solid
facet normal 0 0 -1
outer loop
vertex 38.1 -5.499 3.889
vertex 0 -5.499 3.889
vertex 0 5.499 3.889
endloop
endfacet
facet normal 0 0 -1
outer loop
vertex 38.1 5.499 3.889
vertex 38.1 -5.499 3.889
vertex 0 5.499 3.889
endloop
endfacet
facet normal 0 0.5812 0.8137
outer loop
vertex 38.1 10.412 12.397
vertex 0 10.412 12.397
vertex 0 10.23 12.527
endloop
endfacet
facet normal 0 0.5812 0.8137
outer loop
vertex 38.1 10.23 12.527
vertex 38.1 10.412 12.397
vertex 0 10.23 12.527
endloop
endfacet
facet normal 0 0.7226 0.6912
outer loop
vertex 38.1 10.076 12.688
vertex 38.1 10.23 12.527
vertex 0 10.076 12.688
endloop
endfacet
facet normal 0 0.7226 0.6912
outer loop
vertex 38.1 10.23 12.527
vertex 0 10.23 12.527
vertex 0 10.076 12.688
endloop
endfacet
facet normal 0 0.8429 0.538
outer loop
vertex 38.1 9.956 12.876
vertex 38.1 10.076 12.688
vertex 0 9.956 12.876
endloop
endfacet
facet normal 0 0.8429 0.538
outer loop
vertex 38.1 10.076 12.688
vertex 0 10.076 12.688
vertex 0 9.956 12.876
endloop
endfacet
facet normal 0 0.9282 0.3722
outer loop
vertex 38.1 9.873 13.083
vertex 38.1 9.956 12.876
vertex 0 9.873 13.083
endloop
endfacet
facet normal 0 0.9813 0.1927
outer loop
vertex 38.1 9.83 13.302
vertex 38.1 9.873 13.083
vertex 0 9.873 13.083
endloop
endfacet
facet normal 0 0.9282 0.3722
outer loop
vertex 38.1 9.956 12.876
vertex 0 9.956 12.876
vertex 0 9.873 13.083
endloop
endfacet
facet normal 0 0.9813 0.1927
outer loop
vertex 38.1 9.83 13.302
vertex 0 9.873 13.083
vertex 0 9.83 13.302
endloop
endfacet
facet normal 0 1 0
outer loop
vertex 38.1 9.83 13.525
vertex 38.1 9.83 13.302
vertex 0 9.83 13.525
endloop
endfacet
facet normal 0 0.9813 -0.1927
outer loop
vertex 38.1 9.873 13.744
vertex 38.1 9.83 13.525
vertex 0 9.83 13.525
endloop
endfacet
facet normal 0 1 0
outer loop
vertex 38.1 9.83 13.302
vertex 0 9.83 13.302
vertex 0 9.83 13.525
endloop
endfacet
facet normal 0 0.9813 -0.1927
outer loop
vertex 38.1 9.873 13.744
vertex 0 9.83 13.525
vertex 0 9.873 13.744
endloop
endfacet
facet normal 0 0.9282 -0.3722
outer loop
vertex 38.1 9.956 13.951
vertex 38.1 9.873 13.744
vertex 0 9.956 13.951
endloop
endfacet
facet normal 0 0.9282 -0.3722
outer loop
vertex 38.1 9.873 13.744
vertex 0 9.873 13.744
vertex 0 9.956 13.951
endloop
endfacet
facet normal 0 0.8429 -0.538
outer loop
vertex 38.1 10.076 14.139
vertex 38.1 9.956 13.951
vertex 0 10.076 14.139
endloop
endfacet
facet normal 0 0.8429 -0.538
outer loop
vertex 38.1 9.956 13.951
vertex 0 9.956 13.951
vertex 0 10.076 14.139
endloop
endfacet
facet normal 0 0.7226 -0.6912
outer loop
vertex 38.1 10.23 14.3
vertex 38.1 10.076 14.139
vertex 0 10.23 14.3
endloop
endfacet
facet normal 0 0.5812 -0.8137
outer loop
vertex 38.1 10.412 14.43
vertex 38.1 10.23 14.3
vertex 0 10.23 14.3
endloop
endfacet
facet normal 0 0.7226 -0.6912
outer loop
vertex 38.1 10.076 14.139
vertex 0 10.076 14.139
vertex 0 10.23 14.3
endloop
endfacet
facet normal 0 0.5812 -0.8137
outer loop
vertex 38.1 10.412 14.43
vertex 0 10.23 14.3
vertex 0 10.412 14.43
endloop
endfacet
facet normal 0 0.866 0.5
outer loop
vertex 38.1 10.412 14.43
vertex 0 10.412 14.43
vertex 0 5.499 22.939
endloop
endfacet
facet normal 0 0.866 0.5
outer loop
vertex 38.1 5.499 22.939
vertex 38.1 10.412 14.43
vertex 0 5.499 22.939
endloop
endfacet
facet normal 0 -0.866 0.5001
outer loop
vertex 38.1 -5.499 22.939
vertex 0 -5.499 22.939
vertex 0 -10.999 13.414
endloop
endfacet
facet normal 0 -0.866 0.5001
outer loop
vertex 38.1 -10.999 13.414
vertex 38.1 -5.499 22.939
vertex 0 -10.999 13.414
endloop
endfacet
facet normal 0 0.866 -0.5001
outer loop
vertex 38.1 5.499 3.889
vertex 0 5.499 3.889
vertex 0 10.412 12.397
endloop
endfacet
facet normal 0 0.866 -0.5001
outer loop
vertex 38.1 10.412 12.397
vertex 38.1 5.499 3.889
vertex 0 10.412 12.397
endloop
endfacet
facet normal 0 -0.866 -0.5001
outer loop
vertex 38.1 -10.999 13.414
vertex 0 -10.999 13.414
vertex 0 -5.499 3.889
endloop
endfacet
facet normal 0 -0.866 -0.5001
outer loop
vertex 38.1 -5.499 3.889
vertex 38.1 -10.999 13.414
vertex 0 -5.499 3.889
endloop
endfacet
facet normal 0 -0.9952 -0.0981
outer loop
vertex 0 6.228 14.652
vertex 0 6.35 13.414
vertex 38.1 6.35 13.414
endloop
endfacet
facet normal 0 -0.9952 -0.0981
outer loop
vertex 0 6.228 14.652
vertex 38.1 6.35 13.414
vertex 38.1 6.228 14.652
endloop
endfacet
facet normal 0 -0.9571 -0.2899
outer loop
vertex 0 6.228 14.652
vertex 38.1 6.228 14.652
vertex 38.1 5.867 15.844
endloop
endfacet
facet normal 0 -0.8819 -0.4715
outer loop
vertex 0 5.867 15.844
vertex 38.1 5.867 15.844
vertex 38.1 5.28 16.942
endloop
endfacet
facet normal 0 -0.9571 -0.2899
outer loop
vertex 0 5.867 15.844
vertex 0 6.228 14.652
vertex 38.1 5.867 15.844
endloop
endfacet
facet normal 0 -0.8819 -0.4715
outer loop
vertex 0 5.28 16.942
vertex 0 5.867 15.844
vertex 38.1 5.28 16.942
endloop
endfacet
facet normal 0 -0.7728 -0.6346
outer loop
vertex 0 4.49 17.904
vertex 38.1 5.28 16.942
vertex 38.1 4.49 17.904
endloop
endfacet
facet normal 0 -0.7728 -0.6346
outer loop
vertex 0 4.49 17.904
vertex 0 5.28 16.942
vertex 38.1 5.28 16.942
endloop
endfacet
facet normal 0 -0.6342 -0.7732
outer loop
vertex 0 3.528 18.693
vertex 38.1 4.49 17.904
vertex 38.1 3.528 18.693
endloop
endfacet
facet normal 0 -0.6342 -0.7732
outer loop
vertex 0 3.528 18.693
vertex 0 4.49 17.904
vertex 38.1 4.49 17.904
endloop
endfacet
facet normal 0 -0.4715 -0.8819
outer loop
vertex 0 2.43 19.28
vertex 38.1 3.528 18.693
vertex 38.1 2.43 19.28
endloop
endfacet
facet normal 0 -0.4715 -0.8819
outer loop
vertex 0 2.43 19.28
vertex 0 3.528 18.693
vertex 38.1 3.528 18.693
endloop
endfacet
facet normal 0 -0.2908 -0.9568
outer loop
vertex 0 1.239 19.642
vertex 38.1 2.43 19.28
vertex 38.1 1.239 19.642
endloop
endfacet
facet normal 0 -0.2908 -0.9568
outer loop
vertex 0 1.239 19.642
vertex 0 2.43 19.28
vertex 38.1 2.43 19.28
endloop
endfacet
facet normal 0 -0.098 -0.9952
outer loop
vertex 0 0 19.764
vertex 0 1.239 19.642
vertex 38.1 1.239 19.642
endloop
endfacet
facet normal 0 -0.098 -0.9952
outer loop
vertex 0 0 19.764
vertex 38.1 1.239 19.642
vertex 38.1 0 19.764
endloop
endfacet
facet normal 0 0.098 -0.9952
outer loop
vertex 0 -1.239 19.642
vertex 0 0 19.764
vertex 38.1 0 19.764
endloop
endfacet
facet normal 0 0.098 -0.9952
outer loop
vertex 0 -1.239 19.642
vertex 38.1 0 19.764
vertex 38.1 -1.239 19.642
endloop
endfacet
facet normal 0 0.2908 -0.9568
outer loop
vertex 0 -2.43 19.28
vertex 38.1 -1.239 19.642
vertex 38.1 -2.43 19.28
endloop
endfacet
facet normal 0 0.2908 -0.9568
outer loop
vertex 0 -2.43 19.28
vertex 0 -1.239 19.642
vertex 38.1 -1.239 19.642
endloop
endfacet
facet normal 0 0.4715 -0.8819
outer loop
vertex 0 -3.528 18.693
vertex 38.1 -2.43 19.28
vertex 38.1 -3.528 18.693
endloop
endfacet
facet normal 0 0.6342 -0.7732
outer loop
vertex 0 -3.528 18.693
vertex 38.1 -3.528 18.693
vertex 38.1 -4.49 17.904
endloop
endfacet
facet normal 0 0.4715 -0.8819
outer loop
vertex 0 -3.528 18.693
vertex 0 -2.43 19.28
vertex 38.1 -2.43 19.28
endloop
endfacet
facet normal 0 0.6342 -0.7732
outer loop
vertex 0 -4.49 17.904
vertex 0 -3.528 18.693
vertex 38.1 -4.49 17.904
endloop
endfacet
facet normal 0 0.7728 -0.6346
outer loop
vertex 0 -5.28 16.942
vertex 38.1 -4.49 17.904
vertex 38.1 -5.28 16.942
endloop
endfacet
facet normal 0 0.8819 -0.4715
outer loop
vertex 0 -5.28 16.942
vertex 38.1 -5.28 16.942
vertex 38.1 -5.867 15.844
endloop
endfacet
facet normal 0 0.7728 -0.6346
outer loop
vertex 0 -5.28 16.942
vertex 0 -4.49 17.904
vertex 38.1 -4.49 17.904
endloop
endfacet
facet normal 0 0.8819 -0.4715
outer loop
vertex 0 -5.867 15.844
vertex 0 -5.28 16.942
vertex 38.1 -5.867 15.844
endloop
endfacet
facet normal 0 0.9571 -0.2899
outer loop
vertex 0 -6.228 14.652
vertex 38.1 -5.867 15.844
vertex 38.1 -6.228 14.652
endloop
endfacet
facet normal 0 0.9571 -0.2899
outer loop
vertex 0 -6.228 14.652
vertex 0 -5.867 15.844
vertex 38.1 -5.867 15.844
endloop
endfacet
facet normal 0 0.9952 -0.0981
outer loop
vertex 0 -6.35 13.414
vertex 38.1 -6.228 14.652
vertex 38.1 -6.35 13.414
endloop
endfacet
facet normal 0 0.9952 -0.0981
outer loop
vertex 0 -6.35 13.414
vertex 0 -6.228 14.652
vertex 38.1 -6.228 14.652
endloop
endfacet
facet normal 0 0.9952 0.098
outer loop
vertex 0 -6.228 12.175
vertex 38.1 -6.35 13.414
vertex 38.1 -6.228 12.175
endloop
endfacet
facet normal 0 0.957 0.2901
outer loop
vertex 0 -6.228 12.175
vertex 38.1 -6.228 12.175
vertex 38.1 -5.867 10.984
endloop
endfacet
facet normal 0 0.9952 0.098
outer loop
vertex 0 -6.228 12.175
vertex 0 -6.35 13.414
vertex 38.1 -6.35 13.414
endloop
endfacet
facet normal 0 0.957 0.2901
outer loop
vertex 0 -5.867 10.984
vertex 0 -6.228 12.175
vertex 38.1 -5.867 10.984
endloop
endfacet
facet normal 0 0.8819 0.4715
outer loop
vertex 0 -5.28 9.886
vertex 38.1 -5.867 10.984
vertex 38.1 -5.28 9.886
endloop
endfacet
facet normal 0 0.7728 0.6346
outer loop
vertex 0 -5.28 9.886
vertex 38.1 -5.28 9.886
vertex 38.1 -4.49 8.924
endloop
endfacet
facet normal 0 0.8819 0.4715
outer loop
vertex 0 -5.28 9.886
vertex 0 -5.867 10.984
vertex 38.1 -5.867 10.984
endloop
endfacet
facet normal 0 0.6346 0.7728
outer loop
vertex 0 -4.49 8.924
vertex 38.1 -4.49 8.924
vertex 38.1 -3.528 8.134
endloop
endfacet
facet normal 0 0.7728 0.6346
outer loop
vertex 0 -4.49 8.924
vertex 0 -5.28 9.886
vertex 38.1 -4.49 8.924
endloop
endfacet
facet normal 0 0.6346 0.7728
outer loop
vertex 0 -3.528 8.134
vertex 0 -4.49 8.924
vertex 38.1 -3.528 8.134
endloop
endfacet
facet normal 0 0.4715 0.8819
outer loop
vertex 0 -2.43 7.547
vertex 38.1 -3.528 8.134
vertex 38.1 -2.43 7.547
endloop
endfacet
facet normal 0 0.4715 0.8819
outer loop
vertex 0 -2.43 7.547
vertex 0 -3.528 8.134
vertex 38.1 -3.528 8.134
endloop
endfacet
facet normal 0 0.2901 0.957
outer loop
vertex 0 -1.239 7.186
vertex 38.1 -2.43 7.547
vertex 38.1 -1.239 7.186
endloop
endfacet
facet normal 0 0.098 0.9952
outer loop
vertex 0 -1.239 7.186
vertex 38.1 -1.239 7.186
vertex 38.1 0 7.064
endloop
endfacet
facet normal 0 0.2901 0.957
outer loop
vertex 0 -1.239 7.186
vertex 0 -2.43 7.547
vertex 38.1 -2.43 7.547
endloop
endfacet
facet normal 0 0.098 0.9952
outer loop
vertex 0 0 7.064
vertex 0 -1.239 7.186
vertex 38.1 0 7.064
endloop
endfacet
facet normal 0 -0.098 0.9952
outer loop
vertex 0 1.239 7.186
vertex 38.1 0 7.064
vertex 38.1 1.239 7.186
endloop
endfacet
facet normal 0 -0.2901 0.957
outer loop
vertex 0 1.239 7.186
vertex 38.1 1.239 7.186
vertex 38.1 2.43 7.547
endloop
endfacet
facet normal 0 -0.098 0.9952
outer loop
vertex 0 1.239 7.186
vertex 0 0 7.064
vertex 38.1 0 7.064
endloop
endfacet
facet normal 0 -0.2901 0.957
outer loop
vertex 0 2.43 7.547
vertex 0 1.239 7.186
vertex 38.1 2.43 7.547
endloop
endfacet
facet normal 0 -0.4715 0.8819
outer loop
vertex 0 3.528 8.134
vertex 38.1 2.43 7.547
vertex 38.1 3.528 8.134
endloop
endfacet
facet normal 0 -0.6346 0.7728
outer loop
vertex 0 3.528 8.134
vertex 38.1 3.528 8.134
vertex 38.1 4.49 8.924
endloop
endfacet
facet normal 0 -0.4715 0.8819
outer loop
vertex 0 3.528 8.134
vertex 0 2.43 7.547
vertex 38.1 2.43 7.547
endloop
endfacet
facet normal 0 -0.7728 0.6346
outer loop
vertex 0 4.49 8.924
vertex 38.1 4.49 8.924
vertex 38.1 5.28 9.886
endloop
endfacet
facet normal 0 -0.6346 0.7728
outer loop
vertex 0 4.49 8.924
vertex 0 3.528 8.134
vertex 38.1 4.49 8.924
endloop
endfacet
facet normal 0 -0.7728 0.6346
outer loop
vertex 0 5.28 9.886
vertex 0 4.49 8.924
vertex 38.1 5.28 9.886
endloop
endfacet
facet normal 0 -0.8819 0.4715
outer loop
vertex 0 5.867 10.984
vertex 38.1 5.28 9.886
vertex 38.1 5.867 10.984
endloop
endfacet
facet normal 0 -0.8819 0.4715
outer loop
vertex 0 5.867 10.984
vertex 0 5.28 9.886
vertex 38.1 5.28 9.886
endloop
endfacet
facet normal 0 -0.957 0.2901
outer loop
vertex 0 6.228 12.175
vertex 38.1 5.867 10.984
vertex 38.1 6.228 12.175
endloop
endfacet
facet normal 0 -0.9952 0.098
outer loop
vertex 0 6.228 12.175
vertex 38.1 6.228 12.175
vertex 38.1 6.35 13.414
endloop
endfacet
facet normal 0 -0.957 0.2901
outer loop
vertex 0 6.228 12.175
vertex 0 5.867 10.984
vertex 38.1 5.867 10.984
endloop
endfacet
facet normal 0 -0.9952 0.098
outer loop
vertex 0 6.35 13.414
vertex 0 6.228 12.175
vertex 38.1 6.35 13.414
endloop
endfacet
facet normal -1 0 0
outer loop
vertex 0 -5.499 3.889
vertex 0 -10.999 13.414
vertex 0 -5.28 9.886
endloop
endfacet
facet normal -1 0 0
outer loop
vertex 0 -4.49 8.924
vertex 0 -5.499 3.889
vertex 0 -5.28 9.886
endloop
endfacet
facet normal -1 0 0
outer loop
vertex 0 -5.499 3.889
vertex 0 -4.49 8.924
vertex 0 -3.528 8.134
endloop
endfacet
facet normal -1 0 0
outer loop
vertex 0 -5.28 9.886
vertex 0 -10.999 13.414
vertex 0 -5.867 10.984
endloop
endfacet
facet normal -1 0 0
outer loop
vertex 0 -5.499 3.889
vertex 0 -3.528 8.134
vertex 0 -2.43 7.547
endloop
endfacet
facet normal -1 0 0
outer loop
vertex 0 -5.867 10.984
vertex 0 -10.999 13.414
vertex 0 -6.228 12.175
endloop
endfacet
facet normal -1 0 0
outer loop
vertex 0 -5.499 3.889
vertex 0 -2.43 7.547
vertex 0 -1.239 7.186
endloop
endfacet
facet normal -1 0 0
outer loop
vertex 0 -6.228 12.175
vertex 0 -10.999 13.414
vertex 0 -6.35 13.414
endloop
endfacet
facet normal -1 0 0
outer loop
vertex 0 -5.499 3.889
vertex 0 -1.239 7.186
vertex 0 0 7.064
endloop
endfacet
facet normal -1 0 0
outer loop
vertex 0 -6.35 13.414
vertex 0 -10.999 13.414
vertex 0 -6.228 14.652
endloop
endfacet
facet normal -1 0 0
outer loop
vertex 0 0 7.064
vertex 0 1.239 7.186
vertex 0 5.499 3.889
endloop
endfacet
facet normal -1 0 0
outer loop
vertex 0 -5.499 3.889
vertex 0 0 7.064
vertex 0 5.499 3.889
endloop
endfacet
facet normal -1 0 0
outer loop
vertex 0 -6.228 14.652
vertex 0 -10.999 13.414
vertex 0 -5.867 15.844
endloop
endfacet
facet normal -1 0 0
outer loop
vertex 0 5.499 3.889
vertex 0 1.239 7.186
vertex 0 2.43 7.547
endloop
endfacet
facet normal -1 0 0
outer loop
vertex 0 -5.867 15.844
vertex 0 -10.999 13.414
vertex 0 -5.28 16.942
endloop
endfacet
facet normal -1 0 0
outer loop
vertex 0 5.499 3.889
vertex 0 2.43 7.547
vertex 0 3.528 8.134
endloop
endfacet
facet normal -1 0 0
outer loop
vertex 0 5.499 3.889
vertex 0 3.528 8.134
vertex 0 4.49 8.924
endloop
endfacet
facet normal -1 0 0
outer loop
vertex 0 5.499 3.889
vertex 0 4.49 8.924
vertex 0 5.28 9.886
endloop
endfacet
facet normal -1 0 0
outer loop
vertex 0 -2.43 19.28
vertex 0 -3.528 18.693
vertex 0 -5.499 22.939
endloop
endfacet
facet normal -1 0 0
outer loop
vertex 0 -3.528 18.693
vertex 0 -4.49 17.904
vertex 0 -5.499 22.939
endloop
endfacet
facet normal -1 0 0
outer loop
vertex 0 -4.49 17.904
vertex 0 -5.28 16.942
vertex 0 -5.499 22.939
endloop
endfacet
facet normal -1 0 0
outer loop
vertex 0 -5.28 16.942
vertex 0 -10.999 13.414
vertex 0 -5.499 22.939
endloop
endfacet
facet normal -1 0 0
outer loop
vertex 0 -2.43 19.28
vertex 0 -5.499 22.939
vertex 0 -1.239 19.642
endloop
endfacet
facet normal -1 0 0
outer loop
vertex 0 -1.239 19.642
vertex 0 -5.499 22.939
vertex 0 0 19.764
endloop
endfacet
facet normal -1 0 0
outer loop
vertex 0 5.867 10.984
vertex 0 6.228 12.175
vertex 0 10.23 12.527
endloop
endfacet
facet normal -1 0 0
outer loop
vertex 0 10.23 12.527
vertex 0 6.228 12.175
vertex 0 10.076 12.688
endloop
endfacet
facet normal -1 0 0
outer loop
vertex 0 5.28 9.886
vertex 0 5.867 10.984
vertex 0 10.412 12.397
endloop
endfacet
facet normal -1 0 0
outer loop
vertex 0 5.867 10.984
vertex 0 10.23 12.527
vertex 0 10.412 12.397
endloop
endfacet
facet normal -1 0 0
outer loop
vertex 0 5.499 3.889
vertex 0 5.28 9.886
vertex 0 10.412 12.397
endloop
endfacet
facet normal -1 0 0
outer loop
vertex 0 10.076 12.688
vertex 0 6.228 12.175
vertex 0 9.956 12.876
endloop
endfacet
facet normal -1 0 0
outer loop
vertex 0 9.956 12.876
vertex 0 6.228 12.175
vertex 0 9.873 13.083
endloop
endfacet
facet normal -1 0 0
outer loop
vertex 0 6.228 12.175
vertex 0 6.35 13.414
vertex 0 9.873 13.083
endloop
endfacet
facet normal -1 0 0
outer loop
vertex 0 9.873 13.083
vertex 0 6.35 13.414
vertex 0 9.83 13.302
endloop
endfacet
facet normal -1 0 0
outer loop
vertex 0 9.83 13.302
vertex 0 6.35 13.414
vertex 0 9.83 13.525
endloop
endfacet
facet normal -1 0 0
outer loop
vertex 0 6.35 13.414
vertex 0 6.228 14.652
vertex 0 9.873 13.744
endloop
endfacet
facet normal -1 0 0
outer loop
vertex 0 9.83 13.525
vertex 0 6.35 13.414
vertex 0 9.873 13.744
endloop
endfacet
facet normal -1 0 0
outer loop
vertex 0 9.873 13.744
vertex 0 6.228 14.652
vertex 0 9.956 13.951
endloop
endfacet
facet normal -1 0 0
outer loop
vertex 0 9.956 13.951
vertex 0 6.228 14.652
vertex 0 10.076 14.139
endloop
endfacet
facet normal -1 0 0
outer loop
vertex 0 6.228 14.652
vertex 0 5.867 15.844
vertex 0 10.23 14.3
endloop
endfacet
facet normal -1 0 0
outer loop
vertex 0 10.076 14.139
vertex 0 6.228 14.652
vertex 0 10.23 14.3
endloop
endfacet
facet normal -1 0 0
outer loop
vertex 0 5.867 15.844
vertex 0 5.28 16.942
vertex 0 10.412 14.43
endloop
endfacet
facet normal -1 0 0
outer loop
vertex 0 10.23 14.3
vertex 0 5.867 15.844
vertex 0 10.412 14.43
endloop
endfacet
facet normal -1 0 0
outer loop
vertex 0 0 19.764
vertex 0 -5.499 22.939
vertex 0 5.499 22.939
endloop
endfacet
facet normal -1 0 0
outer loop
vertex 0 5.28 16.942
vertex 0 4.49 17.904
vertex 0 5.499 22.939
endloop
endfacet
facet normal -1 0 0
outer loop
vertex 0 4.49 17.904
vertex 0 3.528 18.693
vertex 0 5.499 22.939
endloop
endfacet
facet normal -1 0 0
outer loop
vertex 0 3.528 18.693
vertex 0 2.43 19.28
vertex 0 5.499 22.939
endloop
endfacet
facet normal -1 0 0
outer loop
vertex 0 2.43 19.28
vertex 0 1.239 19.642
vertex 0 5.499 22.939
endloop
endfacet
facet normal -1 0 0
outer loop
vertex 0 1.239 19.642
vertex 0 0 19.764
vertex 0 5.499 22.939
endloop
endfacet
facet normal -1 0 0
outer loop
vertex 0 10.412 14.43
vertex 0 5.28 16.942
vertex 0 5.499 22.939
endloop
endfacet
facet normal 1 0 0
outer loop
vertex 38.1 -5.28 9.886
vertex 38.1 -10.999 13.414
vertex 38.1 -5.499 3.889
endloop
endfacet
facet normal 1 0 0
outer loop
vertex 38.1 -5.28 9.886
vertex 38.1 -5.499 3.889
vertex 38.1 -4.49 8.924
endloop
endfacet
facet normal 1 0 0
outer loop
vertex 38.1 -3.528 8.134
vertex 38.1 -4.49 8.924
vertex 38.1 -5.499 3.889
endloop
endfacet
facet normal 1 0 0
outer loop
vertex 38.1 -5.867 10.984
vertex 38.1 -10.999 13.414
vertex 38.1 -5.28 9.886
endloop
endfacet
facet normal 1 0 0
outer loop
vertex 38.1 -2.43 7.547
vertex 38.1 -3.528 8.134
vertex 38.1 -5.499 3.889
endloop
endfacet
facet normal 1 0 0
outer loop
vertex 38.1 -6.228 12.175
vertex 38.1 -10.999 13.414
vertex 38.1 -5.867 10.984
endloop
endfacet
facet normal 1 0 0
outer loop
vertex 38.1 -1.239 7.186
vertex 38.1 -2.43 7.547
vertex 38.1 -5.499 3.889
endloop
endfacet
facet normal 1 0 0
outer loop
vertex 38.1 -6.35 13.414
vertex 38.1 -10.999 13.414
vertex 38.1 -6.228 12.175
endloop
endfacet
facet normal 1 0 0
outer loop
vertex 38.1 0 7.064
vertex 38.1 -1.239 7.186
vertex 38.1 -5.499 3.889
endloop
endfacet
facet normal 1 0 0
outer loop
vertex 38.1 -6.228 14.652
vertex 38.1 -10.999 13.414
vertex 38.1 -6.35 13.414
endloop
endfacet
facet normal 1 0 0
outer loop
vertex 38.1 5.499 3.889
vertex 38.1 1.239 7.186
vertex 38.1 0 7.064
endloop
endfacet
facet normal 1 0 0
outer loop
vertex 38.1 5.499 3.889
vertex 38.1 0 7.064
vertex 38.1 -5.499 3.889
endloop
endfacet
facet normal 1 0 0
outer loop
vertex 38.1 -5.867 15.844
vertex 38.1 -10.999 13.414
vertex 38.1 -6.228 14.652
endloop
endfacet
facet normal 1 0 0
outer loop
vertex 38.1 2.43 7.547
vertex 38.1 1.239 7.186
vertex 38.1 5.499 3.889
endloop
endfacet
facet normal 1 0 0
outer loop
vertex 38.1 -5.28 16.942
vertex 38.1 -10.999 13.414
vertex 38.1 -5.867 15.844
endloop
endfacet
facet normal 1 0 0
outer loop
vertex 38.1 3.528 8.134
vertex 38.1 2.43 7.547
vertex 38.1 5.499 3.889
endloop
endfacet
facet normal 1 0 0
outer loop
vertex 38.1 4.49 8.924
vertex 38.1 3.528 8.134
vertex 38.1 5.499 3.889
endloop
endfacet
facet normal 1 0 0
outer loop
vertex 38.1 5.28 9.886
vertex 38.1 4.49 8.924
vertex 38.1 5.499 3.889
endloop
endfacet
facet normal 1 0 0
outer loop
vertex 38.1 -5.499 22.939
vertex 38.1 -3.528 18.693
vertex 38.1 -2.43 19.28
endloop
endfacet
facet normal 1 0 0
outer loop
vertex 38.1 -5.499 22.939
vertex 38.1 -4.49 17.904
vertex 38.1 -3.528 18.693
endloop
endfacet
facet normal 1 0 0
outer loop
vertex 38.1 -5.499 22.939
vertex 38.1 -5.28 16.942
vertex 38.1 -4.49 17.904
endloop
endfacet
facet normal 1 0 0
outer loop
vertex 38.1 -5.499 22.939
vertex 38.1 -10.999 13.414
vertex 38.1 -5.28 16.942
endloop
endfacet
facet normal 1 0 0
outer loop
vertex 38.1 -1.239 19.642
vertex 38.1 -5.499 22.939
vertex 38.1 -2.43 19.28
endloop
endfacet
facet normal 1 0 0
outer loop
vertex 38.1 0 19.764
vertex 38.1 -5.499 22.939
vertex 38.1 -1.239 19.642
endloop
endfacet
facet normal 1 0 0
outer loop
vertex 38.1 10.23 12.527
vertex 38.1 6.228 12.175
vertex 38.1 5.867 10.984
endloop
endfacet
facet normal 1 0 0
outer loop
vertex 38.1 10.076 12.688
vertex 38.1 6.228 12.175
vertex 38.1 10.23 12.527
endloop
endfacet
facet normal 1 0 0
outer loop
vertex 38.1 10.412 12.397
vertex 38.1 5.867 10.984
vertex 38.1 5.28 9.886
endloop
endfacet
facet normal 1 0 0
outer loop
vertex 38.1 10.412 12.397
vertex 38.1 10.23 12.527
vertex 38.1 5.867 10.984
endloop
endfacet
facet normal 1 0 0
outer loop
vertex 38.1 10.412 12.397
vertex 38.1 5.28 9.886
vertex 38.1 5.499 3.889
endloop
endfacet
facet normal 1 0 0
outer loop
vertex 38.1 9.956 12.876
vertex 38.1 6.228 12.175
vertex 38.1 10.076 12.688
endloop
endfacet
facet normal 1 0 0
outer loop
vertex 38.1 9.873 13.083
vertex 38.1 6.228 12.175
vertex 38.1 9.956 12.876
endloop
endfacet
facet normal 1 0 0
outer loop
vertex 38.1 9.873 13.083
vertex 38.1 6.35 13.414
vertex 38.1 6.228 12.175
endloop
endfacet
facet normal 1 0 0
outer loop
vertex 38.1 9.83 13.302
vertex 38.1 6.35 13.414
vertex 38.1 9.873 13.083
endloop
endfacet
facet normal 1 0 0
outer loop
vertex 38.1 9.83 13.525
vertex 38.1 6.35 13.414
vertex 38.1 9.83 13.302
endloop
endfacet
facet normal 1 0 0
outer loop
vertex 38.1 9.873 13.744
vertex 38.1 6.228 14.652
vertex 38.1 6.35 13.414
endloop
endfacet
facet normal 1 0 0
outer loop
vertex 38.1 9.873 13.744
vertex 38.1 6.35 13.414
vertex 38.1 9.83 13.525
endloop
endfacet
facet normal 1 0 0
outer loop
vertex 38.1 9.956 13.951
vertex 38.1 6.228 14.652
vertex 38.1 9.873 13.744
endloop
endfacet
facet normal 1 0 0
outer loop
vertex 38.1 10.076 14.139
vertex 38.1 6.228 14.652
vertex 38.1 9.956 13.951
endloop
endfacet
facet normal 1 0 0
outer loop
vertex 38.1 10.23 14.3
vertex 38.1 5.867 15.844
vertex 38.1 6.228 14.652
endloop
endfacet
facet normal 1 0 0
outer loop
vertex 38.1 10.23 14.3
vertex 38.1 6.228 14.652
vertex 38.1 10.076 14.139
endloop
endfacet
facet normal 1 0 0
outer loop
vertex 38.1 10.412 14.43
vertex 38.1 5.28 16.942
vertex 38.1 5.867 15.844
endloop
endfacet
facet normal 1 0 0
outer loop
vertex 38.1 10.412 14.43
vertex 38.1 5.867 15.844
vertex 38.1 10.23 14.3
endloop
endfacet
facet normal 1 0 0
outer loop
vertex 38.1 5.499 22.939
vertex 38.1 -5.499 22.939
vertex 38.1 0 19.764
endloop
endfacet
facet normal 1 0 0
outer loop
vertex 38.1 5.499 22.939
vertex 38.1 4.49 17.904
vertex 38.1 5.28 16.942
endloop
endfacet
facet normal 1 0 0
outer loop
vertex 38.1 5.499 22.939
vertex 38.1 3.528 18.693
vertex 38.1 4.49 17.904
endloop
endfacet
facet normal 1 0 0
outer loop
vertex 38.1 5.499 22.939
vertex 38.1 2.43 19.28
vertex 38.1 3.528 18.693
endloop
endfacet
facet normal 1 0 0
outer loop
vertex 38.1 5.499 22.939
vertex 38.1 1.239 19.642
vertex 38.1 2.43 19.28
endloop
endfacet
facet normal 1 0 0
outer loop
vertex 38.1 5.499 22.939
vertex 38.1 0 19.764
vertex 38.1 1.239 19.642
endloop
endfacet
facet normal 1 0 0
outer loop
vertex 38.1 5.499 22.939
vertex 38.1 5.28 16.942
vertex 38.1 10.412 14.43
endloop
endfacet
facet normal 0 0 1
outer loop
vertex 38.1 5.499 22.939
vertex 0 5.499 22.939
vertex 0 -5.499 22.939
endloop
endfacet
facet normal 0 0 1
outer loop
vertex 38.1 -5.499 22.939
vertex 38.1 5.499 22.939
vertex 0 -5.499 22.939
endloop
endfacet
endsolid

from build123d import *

# Parameters (mm, degrees)
F0_R     = 6.35
F1_DEPTH = 38.1


with BuildPart() as f1:
    # F0 (on Right) → F1 (new body)
    with BuildSketch(Plane.YZ):
        with BuildLine():
            Line((-5.499261, 3.888647), (5.499261, 3.888647))
            Line((5.499261, 3.888647), (10.411803, 12.397418))
            ThreePointArc((10.411803, 12.397418), (9.825083, 13.413647), (10.411803, 14.429875))
            Line((10.411803, 14.429875), (5.499261, 22.938647))
            Line((5.499261, 22.938647), (-5.499261, 22.938647))
            Line((-5.499261, 22.938647), (-10.998523, 13.413647))
            Line((-10.998523, 13.413647), (-5.499261, 3.888647))
        make_face()
        with Locations((0, 13.413647)):
            Circle(F0_R, mode=Mode.SUBTRACT)
    extrude(amount=F1_DEPTH)


solid = f1.part
